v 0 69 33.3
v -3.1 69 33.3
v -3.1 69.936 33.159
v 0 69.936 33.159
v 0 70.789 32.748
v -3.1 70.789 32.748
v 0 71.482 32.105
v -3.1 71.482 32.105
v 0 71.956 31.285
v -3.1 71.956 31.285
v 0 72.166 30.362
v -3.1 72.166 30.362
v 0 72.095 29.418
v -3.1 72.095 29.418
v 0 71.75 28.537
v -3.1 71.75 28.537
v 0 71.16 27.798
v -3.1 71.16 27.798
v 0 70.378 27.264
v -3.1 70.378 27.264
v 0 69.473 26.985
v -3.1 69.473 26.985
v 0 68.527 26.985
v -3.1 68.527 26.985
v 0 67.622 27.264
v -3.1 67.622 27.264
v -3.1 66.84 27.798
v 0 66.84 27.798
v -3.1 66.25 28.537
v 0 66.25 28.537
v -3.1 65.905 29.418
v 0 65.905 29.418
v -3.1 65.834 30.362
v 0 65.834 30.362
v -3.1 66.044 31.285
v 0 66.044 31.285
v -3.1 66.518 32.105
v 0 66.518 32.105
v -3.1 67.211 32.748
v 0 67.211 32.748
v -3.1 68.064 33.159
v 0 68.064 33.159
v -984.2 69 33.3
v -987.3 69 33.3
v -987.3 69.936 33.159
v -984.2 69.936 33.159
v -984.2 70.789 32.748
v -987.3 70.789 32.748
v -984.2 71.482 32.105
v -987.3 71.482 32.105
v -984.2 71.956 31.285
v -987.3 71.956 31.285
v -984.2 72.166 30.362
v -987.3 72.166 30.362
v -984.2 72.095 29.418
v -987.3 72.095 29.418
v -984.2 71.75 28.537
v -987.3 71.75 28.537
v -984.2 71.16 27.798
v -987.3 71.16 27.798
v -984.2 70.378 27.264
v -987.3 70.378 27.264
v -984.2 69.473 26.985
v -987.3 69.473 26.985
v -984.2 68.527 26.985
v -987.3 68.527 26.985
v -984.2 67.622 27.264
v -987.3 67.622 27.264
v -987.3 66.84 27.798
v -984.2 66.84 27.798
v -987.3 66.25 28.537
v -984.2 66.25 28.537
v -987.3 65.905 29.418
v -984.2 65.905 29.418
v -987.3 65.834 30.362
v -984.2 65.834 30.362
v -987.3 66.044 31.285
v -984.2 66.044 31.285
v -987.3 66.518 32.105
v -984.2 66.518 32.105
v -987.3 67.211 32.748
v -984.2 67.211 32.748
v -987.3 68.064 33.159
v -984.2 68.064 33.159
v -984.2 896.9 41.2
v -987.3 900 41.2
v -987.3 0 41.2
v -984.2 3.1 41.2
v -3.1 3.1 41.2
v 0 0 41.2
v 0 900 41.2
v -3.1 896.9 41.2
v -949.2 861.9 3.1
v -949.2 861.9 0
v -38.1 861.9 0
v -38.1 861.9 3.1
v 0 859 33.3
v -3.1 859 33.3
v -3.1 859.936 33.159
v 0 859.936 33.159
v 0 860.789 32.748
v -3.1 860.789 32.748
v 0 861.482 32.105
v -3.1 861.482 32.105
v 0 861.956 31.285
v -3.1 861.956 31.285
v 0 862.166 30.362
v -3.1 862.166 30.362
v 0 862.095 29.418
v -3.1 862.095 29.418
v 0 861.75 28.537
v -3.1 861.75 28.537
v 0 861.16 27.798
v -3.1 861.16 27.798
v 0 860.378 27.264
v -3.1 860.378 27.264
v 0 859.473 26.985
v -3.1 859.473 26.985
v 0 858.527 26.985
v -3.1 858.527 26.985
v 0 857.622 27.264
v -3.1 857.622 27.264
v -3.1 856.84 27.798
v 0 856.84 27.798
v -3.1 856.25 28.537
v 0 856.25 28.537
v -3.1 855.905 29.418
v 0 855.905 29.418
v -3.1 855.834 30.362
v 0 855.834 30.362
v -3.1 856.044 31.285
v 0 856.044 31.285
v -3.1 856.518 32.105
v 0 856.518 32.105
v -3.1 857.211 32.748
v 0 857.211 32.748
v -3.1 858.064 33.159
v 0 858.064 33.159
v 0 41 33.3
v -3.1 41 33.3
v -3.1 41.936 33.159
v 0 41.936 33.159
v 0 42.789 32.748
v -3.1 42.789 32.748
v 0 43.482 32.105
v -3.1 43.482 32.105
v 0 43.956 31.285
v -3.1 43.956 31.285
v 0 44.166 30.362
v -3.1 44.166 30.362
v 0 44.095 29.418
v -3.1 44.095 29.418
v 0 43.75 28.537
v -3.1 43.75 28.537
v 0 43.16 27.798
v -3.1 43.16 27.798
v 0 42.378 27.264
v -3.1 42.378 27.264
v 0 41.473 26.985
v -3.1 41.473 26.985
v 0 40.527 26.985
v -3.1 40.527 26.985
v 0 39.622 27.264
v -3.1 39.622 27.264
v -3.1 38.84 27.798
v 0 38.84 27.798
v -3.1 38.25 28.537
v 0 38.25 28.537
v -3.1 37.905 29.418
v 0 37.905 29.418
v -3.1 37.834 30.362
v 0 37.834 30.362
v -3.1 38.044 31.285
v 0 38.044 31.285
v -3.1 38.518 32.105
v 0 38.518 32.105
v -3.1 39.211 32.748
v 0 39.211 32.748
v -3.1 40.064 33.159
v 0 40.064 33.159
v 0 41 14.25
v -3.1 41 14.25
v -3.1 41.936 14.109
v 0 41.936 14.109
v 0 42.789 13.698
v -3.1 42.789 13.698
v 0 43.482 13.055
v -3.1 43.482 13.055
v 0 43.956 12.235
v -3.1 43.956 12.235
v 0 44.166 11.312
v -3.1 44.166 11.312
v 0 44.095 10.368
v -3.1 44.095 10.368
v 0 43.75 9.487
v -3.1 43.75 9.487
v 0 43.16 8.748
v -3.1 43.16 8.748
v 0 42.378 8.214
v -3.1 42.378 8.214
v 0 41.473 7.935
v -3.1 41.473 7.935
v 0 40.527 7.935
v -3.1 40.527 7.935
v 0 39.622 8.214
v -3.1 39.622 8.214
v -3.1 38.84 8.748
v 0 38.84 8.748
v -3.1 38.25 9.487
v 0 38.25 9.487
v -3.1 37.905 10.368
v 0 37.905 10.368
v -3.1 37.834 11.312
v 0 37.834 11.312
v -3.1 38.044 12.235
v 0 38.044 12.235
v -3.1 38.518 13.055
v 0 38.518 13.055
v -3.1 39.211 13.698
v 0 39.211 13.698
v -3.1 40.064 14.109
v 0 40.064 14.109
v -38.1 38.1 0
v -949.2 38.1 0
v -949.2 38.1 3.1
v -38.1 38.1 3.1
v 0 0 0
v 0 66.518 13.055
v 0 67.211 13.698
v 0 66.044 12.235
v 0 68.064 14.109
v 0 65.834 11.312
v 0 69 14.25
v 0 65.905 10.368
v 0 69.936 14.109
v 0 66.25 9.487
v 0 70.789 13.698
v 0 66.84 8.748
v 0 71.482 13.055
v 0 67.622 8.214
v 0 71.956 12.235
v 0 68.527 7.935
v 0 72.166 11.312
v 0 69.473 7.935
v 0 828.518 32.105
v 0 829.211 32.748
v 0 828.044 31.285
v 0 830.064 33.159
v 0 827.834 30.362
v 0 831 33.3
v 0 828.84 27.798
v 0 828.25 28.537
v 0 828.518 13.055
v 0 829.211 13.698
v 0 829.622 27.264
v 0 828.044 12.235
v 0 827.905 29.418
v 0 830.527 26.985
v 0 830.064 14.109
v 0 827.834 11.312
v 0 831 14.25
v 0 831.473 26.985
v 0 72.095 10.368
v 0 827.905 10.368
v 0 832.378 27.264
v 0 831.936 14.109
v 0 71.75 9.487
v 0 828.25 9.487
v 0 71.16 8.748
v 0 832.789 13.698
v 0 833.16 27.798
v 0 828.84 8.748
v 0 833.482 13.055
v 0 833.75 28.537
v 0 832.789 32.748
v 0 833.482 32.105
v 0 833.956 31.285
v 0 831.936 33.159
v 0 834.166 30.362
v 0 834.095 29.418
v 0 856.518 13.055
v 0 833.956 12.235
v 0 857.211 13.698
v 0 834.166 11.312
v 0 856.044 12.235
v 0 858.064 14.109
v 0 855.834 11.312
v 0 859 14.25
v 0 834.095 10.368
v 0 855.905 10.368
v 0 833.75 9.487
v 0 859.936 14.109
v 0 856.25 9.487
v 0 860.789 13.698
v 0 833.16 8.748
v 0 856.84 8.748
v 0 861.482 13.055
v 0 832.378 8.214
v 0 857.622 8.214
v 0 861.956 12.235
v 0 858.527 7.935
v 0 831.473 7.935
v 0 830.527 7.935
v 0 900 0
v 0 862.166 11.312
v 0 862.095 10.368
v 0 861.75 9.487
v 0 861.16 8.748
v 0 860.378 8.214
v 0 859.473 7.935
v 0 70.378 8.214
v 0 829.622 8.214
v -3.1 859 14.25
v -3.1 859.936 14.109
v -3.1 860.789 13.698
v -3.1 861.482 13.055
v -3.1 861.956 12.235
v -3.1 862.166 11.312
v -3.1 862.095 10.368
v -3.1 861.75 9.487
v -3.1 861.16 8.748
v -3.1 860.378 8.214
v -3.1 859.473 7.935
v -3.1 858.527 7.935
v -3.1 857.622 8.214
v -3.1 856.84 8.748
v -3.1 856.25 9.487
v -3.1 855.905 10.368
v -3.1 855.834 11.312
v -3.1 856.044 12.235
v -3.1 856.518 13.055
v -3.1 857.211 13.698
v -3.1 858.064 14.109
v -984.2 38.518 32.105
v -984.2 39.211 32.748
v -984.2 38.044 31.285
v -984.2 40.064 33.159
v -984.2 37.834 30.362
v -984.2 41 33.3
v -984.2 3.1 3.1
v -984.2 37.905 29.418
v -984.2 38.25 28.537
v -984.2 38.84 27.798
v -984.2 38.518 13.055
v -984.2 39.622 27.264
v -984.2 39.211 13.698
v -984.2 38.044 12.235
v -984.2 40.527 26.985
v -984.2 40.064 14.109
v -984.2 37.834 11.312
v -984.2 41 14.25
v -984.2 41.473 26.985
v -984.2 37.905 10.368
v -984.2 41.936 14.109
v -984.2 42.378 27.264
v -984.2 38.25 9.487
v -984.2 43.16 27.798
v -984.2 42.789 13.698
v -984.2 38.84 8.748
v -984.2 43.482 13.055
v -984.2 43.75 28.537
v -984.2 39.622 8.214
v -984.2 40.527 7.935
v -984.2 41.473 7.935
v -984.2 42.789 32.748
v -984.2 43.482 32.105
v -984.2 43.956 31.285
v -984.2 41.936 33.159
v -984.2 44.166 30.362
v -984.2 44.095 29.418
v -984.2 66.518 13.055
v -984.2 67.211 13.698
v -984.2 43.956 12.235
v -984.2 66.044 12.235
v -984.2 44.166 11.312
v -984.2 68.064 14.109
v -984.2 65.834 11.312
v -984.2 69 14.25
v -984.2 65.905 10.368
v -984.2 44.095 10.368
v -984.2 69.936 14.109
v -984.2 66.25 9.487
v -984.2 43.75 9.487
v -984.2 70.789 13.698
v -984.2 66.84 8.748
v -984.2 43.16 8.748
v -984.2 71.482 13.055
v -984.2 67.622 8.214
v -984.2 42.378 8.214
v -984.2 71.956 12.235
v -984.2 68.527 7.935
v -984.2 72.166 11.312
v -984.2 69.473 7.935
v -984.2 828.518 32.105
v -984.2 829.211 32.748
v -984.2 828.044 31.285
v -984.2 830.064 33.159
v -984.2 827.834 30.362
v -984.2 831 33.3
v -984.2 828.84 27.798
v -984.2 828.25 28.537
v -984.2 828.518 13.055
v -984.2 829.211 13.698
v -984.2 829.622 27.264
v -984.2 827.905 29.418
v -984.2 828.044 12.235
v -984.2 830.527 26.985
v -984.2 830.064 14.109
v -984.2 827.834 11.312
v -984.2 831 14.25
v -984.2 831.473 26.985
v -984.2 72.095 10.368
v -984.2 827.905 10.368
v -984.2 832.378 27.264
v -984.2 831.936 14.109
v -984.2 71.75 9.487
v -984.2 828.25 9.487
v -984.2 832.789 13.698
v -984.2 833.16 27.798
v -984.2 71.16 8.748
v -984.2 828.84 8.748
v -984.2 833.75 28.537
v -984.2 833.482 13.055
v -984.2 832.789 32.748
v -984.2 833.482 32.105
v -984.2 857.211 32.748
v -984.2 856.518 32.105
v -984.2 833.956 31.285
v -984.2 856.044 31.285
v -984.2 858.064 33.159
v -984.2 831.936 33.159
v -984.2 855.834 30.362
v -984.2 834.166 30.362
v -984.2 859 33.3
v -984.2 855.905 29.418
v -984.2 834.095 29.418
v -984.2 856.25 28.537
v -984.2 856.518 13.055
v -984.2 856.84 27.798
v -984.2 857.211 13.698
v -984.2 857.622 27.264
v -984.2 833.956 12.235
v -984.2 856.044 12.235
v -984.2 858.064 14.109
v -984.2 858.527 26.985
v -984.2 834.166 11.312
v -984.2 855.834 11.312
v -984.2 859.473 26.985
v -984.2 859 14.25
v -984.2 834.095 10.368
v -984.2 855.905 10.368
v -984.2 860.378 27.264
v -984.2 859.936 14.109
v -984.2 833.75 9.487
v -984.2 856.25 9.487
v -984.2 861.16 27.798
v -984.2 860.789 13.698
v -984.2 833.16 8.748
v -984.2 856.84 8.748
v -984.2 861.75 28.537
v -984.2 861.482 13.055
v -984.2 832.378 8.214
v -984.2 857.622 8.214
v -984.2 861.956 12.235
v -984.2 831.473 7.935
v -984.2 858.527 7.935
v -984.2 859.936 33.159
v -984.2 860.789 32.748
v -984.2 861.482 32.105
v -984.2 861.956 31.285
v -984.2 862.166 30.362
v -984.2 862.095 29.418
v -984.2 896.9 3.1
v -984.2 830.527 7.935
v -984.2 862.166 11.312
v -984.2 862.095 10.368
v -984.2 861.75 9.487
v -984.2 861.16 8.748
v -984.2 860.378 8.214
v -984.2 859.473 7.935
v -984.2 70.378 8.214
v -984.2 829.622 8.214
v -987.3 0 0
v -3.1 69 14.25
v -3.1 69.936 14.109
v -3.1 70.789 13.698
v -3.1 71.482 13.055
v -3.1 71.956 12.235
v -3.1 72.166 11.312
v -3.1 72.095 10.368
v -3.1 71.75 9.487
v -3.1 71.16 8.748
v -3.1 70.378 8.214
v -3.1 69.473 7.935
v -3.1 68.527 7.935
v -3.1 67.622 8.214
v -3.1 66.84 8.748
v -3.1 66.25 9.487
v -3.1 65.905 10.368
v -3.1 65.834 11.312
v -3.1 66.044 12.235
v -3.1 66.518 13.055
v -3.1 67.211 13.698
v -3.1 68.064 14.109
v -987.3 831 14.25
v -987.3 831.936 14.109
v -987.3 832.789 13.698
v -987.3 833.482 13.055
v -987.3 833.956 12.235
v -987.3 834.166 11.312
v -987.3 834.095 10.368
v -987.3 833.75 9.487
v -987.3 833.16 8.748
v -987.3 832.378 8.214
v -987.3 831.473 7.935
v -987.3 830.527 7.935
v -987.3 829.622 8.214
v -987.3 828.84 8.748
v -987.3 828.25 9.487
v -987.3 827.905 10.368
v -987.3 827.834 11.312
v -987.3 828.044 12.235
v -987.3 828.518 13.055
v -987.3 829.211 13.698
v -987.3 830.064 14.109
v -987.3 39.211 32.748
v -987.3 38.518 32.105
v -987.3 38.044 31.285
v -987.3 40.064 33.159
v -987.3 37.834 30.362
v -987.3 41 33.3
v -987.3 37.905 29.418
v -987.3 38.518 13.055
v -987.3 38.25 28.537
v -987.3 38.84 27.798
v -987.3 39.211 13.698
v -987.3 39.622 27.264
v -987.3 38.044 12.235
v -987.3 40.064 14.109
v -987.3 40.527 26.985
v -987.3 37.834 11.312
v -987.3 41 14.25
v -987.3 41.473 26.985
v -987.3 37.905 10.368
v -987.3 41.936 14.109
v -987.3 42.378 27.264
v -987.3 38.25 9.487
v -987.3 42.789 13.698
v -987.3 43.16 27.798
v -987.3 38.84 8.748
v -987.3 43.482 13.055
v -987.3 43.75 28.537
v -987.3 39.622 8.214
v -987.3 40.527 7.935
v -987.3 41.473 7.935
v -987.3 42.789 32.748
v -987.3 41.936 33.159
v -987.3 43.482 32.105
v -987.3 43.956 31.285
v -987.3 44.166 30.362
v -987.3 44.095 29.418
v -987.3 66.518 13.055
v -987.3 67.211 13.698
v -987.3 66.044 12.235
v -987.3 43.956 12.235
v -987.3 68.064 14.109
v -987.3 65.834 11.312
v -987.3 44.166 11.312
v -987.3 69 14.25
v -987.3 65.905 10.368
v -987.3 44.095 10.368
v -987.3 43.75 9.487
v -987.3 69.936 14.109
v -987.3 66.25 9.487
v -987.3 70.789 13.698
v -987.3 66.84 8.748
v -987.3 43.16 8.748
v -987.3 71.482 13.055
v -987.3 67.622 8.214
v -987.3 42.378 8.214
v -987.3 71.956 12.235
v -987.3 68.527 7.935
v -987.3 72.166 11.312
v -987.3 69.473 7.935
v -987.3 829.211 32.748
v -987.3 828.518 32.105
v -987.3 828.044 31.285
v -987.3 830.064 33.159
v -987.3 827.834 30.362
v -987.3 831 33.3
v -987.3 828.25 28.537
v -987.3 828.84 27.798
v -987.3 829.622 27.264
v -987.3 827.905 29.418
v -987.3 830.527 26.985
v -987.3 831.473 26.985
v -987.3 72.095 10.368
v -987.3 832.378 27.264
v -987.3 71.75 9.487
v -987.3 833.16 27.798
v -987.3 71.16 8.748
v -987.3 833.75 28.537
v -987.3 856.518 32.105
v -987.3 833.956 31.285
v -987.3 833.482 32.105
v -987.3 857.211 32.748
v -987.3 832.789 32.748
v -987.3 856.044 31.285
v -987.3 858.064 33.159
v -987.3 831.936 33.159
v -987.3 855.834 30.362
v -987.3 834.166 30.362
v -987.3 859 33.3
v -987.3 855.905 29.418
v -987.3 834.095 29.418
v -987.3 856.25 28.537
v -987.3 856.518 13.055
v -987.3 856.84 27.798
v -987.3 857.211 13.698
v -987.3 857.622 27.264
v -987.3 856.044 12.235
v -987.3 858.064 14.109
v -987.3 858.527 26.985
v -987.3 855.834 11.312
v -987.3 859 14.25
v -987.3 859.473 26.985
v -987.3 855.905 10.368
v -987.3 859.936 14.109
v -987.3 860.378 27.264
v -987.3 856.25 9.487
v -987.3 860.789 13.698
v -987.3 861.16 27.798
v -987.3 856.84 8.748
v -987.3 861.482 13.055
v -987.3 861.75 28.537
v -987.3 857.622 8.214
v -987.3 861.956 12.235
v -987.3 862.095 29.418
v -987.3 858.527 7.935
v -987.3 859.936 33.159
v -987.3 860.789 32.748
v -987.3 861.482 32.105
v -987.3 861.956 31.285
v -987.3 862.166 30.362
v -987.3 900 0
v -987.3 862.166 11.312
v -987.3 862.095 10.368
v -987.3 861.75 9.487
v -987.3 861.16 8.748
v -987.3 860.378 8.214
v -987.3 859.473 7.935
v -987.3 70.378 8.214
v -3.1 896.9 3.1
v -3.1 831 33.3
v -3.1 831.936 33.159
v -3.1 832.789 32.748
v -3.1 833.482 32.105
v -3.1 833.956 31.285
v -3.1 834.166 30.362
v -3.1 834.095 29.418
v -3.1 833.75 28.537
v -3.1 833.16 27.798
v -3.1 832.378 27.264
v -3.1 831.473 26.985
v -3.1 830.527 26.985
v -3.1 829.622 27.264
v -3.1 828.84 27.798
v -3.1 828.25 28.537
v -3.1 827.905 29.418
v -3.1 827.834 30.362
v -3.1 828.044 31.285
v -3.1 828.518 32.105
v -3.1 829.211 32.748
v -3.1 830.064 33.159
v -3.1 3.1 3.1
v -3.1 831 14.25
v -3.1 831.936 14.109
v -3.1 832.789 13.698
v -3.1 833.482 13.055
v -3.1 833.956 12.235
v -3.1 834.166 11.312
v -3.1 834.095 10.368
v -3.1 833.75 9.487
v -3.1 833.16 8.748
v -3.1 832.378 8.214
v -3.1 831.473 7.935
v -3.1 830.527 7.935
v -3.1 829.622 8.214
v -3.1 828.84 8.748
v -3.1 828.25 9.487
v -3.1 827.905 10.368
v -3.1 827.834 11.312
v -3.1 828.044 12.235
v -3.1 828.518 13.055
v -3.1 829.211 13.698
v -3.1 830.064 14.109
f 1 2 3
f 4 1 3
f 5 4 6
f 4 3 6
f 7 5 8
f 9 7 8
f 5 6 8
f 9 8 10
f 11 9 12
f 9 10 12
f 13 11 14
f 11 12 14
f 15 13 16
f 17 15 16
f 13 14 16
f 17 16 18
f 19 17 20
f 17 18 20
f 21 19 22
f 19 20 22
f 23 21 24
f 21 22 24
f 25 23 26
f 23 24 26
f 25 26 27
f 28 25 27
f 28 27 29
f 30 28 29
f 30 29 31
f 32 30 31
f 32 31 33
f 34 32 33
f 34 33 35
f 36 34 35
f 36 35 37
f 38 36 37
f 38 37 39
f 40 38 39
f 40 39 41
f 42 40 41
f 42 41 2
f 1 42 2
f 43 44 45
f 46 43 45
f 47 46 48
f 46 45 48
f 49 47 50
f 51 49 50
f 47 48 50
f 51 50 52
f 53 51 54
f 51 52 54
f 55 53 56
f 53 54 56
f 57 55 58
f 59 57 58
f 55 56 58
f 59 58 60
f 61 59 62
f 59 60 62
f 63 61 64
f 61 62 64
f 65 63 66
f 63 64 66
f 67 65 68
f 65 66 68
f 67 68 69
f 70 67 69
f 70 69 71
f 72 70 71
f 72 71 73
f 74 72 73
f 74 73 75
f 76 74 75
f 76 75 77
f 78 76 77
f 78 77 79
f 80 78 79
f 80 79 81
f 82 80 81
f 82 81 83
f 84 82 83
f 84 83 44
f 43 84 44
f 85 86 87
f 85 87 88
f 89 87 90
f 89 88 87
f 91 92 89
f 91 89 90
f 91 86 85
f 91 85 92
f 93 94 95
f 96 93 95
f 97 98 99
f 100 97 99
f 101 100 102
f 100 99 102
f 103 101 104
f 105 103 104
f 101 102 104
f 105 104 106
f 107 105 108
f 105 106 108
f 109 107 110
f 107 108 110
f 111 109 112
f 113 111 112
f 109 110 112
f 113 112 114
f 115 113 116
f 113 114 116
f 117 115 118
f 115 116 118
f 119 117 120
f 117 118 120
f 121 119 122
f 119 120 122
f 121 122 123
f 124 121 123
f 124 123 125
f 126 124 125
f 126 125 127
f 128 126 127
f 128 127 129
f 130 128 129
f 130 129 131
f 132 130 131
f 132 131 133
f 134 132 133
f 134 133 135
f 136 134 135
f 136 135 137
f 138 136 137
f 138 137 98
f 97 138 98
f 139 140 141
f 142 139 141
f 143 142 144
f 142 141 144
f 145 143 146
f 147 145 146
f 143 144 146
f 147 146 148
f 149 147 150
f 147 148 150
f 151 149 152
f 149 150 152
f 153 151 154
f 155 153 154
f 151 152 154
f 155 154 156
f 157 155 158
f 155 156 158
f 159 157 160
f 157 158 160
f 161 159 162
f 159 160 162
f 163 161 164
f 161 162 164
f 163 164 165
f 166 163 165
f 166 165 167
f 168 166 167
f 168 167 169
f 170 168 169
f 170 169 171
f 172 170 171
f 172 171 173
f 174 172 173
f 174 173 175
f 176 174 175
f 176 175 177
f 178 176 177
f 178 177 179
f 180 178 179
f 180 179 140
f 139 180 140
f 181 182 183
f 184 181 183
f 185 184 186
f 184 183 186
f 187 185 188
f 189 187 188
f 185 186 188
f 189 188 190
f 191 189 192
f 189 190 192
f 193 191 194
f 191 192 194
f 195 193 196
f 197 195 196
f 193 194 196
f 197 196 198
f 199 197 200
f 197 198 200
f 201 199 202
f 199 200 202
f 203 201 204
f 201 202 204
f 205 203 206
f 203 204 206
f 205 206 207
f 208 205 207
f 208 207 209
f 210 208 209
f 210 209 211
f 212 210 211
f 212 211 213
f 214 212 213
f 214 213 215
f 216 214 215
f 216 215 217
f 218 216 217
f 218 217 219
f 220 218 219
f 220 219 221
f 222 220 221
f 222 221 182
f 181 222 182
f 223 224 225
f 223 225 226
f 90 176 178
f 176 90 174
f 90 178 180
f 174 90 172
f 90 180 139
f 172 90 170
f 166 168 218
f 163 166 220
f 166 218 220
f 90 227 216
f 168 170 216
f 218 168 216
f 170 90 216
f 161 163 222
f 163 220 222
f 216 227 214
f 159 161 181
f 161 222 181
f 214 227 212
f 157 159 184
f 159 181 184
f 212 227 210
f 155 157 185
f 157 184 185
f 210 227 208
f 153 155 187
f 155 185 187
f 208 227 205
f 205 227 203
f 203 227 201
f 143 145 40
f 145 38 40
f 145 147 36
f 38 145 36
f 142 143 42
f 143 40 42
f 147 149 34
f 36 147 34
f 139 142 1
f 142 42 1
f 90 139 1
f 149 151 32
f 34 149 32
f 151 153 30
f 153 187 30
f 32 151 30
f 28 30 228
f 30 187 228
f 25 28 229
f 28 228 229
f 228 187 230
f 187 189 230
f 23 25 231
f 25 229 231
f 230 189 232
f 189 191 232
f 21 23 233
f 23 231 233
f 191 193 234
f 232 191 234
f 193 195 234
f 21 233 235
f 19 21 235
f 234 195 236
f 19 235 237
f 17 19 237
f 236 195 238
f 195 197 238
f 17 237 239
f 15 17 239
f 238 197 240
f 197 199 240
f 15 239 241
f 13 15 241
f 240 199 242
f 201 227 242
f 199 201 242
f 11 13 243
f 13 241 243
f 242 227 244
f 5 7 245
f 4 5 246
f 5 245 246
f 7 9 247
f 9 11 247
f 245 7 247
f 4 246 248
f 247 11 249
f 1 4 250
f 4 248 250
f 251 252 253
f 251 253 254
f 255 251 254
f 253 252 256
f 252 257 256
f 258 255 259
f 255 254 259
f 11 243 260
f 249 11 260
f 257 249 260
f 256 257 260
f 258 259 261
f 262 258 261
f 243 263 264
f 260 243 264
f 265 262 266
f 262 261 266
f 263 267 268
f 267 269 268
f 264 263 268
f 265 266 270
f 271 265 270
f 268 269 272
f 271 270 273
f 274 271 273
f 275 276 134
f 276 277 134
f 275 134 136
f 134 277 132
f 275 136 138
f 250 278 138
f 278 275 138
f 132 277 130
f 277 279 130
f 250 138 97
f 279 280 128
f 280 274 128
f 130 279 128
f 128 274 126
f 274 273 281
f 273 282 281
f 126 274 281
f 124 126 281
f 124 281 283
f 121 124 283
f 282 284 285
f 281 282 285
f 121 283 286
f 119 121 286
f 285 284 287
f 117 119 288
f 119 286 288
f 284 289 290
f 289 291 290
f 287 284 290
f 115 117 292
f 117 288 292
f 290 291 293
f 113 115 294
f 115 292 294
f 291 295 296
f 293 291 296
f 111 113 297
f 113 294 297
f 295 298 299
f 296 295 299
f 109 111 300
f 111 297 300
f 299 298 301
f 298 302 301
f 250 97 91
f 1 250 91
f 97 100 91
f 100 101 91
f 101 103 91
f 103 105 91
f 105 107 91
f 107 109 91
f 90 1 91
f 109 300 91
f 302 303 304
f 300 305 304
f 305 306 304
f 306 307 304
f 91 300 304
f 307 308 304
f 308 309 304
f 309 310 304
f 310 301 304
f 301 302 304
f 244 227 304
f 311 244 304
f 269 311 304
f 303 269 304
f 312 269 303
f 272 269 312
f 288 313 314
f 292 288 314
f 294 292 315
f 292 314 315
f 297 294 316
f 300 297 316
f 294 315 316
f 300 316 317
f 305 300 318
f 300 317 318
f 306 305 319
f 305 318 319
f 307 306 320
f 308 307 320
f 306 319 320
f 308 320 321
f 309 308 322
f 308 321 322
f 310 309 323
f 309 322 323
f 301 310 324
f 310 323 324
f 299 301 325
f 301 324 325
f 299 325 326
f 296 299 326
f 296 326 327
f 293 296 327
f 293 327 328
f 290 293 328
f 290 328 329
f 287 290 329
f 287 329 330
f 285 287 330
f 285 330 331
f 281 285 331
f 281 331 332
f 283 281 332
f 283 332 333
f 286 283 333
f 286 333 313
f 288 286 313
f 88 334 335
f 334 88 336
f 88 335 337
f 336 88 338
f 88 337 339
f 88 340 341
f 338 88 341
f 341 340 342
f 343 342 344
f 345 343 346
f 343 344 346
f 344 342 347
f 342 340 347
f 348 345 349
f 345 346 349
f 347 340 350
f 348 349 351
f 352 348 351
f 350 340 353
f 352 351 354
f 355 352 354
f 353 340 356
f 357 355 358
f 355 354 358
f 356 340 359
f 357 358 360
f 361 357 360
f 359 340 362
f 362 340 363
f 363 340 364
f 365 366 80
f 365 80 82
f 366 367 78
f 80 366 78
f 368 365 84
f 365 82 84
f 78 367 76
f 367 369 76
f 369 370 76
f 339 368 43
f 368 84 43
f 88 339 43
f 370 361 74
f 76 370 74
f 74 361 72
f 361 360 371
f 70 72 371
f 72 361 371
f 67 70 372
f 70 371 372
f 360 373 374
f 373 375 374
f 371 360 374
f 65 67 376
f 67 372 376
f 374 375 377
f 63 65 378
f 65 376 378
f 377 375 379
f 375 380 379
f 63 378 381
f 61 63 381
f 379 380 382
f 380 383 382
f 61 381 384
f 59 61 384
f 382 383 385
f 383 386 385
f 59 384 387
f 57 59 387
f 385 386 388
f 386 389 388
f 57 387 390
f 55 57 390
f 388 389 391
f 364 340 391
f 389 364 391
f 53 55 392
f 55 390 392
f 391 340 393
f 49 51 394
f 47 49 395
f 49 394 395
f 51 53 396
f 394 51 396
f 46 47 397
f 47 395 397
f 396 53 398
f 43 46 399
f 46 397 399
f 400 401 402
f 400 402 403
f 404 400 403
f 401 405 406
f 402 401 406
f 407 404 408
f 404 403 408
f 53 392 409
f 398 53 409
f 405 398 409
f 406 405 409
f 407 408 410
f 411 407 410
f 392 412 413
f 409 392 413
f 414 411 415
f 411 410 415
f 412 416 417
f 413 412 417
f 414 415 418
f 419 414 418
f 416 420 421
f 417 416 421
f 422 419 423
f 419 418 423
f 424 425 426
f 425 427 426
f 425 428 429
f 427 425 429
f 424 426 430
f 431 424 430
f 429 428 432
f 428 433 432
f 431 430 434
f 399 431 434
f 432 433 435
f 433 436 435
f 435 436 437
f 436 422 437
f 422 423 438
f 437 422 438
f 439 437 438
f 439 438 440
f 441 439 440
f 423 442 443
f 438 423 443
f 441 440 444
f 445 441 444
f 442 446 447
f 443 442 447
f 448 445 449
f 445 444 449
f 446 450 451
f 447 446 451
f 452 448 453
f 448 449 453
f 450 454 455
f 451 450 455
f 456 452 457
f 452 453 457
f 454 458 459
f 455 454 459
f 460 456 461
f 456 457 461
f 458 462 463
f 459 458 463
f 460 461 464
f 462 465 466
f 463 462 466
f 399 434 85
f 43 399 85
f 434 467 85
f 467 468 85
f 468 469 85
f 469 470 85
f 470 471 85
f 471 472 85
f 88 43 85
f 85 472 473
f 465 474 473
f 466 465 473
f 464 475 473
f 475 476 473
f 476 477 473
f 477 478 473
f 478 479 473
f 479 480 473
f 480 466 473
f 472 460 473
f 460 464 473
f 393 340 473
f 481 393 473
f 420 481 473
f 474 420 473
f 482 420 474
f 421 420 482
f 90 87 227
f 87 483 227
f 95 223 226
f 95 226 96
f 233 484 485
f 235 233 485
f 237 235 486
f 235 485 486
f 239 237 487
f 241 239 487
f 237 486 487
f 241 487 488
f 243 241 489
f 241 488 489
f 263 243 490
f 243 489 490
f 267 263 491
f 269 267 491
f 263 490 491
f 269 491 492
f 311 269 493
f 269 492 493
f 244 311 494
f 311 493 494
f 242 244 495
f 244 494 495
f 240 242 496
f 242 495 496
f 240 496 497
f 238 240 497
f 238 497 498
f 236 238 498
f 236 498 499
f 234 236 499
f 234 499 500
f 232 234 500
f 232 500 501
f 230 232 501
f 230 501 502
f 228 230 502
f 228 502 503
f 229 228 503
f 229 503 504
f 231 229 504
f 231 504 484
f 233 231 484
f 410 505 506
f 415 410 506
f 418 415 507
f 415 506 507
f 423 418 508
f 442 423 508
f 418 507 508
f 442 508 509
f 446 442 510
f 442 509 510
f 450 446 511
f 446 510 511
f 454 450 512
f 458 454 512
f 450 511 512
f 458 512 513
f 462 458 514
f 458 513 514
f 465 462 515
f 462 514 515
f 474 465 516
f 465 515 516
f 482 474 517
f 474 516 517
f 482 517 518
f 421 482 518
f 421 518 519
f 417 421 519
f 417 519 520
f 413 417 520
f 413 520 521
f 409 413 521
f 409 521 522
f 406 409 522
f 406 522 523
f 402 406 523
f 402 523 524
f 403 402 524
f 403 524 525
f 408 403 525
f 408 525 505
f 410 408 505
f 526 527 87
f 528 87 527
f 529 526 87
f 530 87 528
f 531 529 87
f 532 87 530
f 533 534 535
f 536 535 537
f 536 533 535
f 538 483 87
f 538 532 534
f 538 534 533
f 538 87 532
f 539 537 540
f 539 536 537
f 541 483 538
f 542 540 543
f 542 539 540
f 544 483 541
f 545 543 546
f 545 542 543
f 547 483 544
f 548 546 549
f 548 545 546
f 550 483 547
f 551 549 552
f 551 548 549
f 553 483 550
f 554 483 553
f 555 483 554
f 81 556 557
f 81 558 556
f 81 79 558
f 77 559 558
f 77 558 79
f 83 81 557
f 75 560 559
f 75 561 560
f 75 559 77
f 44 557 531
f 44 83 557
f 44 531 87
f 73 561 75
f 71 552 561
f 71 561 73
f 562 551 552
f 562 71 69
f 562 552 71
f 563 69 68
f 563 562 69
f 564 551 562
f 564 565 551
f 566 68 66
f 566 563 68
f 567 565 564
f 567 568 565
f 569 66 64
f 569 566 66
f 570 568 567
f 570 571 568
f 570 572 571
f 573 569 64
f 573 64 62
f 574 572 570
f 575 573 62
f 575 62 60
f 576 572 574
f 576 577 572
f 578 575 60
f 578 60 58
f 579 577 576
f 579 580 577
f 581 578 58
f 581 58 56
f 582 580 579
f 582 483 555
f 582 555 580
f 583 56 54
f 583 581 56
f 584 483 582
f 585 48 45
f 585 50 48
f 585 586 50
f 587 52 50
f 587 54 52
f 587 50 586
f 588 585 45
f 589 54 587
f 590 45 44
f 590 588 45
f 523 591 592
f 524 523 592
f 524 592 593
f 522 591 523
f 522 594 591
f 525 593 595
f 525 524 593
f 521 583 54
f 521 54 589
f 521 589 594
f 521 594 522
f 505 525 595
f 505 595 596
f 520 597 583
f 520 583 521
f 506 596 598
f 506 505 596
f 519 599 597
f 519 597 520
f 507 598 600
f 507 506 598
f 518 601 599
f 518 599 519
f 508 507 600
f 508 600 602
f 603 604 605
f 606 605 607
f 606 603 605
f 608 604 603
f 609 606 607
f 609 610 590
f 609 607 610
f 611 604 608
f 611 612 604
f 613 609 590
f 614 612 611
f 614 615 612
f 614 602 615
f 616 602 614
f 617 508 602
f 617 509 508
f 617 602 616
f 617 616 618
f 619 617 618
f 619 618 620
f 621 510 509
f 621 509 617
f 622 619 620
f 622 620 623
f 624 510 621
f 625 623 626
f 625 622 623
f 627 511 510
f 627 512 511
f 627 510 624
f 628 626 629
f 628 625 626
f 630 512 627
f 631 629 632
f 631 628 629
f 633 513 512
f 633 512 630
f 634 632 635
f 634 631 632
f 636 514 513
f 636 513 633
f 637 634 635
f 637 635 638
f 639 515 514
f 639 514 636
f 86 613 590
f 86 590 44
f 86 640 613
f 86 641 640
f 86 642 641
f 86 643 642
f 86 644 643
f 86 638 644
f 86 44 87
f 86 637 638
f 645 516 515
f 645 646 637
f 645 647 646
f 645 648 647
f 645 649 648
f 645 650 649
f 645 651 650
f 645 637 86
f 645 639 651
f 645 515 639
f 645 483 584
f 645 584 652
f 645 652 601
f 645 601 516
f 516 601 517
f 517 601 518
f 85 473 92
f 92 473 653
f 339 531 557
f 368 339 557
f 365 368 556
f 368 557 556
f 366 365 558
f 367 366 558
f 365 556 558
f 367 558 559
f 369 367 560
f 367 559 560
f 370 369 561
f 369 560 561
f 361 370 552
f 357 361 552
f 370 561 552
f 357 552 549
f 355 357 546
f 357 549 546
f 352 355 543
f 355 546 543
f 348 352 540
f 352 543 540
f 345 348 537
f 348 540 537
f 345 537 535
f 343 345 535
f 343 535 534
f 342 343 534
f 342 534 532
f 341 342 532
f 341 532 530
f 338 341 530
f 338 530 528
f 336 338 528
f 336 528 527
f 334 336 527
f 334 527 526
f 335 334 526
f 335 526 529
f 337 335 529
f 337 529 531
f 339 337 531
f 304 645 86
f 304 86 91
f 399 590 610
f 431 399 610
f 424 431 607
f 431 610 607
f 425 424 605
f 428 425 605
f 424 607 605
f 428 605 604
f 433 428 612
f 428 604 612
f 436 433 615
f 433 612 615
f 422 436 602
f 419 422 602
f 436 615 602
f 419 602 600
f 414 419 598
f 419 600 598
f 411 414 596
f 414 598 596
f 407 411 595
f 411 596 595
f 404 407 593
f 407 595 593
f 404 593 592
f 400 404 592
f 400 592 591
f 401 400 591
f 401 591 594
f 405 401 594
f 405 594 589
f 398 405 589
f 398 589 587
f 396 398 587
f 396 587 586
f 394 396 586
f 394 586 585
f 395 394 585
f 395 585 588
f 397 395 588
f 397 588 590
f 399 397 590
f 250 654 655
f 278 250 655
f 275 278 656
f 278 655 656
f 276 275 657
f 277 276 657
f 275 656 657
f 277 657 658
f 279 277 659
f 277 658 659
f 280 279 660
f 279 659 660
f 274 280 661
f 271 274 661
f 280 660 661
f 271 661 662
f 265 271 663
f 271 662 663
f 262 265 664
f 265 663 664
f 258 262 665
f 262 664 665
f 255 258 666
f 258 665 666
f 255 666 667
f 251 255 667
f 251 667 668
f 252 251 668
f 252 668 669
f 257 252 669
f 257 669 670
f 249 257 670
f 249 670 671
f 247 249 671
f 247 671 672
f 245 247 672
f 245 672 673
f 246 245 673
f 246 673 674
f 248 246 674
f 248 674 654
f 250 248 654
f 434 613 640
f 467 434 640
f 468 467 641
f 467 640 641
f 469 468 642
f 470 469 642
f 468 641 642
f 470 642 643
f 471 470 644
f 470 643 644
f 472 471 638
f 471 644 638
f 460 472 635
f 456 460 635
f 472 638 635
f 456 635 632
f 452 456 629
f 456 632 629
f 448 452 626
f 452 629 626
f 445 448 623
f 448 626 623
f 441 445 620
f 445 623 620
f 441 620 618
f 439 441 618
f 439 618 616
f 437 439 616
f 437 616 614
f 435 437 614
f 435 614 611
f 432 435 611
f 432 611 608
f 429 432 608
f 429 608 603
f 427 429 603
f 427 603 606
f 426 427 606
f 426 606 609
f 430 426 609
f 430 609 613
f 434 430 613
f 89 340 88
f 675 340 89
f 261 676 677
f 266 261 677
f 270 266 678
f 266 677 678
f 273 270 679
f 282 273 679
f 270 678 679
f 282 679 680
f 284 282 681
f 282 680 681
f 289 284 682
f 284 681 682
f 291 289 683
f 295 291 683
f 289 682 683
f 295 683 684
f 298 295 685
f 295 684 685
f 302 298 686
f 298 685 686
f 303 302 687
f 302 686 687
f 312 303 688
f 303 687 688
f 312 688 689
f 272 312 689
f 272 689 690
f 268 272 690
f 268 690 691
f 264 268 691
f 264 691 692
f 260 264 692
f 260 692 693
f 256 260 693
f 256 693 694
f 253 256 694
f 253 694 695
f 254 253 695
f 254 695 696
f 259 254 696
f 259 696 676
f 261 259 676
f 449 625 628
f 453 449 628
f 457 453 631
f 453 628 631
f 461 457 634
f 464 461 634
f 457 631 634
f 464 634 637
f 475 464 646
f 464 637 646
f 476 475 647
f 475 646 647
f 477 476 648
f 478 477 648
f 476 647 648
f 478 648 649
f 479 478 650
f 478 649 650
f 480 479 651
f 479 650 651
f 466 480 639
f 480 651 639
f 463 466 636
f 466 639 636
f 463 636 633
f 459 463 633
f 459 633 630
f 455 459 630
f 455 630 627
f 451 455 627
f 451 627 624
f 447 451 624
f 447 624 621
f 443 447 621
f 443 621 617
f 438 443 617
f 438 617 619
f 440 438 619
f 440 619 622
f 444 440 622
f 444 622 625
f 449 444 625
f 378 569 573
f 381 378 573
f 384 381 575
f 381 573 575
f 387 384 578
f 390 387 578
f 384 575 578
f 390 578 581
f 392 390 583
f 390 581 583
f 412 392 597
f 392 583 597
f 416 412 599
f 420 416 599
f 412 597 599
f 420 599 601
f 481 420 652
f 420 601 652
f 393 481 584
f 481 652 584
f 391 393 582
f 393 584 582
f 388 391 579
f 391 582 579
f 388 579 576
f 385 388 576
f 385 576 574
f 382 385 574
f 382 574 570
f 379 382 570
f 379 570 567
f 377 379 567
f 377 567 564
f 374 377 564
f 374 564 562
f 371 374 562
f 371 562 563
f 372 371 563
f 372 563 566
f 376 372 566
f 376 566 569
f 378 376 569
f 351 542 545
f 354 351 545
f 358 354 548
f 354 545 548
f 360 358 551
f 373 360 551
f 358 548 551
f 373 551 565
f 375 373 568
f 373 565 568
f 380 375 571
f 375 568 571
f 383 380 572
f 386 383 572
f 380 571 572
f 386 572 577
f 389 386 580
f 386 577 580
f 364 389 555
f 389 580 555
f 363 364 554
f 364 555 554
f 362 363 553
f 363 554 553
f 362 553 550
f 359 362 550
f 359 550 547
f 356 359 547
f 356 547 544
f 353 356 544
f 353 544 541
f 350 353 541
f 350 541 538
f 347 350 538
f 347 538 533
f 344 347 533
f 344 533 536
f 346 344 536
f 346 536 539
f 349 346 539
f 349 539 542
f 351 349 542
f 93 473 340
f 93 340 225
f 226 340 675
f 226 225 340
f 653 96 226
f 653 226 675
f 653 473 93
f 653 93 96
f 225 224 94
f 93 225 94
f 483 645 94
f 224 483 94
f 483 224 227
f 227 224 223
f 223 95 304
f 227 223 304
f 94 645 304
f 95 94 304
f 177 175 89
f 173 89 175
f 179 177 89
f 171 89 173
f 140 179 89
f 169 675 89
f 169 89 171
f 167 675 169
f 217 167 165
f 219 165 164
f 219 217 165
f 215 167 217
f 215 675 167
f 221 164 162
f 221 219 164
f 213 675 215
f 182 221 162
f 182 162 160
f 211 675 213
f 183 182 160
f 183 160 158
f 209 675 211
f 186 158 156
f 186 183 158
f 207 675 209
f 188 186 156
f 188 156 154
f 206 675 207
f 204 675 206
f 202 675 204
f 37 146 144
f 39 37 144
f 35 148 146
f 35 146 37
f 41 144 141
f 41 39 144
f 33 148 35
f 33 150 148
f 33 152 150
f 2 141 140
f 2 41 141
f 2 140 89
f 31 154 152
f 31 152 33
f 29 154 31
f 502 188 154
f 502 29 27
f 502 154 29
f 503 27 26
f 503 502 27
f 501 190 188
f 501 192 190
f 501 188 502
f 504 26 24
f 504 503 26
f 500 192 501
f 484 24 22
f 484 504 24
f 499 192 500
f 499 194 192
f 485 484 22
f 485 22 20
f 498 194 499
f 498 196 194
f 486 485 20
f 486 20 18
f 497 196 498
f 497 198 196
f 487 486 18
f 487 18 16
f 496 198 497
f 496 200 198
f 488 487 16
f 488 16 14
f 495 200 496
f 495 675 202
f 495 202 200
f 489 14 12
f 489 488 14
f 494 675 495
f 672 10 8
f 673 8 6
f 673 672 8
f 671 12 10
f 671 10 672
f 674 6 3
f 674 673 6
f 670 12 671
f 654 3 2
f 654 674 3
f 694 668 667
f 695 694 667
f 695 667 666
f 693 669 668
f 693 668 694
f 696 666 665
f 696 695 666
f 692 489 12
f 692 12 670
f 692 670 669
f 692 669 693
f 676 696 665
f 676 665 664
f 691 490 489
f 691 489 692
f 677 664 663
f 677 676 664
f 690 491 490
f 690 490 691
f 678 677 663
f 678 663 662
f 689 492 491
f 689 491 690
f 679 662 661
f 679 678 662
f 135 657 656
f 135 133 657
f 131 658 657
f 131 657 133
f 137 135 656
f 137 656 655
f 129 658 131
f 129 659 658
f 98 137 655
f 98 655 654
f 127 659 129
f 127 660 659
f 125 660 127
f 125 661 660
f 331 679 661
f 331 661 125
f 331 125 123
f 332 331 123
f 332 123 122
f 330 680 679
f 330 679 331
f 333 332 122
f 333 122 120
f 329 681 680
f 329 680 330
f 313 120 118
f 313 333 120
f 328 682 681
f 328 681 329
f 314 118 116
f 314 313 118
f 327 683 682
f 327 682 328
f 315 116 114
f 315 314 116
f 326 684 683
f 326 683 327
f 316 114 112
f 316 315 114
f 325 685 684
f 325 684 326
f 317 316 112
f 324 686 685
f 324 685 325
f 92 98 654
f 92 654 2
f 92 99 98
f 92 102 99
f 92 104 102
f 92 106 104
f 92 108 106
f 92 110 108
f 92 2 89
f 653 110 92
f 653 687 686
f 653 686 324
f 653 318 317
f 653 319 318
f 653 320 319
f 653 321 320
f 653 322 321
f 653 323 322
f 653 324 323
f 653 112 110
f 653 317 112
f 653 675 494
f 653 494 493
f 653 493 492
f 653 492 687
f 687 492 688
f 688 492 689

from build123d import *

# Parameters (mm, degrees)
CROQUIS1_W              = 987.3
CROQUIS1_H              = 900
CROQUIS1_W_2            = 911.1
CROQUIS1_H_2            = 823.8
SALIENTE_EXTRUIR1_DEPTH = 3.1
CROQUIS2_W              = 987.3
CROQUIS2_H              = 900
CROQUIS2_W_2            = 981.1
CROQUIS2_H_2            = 893.8
SALIENTE_EXTRUIR2_DEPTH = 38.1
CROQUIS3_R              = 3.175
CORTAR_EXTRUIR1_DEPTH   = 1000


with BuildPart() as part:
    # Croquis1 → Saliente-Extruir1 (new body)
    with BuildSketch(Plane.XY):
        with Locations((-493.65, 450)):
            Rectangle(CROQUIS1_W, CROQUIS1_H)
        with Locations((-493.65, 450)):
            Rectangle(CROQUIS1_W_2, CROQUIS1_H_2, mode=Mode.SUBTRACT)
    extrude(amount=SALIENTE_EXTRUIR1_DEPTH)

    # Croquis2 → Saliente-Extruir2 (add)
    with BuildSketch(Plane.XY.offset(3.1)):
        with Locations((-493.65, 450)):
            Rectangle(CROQUIS2_W, CROQUIS2_H)
        with Locations((-493.65, 450)):
            Rectangle(CROQUIS2_W_2, CROQUIS2_H_2, mode=Mode.SUBTRACT)
    extrude(amount=SALIENTE_EXTRUIR2_DEPTH)

    # Croquis3 → Cortar-Extruir1 (cut)
    with BuildSketch(Plane.ZY.offset(987.3)):
        with Locations((11.075, 859)):
            Circle(CROQUIS3_R)
        with Locations((11.075, 831)):
            Circle(CROQUIS3_R)
        with Locations((30.125, 859)):
            Circle(CROQUIS3_R)
        with Locations((30.125, 831)):
            Circle(CROQUIS3_R)
        with Locations((30.125, 69)):
            Circle(CROQUIS3_R)
        with Locations((11.075, 69)):
            Circle(CROQUIS3_R)
        with Locations((11.075, 41)):
            Circle(CROQUIS3_R)
        with Locations((30.125, 41)):
            Circle(CROQUIS3_R)
    extrude(amount=-CORTAR_EXTRUIR1_DEPTH, mode=Mode.SUBTRACT)


solid = part.part
